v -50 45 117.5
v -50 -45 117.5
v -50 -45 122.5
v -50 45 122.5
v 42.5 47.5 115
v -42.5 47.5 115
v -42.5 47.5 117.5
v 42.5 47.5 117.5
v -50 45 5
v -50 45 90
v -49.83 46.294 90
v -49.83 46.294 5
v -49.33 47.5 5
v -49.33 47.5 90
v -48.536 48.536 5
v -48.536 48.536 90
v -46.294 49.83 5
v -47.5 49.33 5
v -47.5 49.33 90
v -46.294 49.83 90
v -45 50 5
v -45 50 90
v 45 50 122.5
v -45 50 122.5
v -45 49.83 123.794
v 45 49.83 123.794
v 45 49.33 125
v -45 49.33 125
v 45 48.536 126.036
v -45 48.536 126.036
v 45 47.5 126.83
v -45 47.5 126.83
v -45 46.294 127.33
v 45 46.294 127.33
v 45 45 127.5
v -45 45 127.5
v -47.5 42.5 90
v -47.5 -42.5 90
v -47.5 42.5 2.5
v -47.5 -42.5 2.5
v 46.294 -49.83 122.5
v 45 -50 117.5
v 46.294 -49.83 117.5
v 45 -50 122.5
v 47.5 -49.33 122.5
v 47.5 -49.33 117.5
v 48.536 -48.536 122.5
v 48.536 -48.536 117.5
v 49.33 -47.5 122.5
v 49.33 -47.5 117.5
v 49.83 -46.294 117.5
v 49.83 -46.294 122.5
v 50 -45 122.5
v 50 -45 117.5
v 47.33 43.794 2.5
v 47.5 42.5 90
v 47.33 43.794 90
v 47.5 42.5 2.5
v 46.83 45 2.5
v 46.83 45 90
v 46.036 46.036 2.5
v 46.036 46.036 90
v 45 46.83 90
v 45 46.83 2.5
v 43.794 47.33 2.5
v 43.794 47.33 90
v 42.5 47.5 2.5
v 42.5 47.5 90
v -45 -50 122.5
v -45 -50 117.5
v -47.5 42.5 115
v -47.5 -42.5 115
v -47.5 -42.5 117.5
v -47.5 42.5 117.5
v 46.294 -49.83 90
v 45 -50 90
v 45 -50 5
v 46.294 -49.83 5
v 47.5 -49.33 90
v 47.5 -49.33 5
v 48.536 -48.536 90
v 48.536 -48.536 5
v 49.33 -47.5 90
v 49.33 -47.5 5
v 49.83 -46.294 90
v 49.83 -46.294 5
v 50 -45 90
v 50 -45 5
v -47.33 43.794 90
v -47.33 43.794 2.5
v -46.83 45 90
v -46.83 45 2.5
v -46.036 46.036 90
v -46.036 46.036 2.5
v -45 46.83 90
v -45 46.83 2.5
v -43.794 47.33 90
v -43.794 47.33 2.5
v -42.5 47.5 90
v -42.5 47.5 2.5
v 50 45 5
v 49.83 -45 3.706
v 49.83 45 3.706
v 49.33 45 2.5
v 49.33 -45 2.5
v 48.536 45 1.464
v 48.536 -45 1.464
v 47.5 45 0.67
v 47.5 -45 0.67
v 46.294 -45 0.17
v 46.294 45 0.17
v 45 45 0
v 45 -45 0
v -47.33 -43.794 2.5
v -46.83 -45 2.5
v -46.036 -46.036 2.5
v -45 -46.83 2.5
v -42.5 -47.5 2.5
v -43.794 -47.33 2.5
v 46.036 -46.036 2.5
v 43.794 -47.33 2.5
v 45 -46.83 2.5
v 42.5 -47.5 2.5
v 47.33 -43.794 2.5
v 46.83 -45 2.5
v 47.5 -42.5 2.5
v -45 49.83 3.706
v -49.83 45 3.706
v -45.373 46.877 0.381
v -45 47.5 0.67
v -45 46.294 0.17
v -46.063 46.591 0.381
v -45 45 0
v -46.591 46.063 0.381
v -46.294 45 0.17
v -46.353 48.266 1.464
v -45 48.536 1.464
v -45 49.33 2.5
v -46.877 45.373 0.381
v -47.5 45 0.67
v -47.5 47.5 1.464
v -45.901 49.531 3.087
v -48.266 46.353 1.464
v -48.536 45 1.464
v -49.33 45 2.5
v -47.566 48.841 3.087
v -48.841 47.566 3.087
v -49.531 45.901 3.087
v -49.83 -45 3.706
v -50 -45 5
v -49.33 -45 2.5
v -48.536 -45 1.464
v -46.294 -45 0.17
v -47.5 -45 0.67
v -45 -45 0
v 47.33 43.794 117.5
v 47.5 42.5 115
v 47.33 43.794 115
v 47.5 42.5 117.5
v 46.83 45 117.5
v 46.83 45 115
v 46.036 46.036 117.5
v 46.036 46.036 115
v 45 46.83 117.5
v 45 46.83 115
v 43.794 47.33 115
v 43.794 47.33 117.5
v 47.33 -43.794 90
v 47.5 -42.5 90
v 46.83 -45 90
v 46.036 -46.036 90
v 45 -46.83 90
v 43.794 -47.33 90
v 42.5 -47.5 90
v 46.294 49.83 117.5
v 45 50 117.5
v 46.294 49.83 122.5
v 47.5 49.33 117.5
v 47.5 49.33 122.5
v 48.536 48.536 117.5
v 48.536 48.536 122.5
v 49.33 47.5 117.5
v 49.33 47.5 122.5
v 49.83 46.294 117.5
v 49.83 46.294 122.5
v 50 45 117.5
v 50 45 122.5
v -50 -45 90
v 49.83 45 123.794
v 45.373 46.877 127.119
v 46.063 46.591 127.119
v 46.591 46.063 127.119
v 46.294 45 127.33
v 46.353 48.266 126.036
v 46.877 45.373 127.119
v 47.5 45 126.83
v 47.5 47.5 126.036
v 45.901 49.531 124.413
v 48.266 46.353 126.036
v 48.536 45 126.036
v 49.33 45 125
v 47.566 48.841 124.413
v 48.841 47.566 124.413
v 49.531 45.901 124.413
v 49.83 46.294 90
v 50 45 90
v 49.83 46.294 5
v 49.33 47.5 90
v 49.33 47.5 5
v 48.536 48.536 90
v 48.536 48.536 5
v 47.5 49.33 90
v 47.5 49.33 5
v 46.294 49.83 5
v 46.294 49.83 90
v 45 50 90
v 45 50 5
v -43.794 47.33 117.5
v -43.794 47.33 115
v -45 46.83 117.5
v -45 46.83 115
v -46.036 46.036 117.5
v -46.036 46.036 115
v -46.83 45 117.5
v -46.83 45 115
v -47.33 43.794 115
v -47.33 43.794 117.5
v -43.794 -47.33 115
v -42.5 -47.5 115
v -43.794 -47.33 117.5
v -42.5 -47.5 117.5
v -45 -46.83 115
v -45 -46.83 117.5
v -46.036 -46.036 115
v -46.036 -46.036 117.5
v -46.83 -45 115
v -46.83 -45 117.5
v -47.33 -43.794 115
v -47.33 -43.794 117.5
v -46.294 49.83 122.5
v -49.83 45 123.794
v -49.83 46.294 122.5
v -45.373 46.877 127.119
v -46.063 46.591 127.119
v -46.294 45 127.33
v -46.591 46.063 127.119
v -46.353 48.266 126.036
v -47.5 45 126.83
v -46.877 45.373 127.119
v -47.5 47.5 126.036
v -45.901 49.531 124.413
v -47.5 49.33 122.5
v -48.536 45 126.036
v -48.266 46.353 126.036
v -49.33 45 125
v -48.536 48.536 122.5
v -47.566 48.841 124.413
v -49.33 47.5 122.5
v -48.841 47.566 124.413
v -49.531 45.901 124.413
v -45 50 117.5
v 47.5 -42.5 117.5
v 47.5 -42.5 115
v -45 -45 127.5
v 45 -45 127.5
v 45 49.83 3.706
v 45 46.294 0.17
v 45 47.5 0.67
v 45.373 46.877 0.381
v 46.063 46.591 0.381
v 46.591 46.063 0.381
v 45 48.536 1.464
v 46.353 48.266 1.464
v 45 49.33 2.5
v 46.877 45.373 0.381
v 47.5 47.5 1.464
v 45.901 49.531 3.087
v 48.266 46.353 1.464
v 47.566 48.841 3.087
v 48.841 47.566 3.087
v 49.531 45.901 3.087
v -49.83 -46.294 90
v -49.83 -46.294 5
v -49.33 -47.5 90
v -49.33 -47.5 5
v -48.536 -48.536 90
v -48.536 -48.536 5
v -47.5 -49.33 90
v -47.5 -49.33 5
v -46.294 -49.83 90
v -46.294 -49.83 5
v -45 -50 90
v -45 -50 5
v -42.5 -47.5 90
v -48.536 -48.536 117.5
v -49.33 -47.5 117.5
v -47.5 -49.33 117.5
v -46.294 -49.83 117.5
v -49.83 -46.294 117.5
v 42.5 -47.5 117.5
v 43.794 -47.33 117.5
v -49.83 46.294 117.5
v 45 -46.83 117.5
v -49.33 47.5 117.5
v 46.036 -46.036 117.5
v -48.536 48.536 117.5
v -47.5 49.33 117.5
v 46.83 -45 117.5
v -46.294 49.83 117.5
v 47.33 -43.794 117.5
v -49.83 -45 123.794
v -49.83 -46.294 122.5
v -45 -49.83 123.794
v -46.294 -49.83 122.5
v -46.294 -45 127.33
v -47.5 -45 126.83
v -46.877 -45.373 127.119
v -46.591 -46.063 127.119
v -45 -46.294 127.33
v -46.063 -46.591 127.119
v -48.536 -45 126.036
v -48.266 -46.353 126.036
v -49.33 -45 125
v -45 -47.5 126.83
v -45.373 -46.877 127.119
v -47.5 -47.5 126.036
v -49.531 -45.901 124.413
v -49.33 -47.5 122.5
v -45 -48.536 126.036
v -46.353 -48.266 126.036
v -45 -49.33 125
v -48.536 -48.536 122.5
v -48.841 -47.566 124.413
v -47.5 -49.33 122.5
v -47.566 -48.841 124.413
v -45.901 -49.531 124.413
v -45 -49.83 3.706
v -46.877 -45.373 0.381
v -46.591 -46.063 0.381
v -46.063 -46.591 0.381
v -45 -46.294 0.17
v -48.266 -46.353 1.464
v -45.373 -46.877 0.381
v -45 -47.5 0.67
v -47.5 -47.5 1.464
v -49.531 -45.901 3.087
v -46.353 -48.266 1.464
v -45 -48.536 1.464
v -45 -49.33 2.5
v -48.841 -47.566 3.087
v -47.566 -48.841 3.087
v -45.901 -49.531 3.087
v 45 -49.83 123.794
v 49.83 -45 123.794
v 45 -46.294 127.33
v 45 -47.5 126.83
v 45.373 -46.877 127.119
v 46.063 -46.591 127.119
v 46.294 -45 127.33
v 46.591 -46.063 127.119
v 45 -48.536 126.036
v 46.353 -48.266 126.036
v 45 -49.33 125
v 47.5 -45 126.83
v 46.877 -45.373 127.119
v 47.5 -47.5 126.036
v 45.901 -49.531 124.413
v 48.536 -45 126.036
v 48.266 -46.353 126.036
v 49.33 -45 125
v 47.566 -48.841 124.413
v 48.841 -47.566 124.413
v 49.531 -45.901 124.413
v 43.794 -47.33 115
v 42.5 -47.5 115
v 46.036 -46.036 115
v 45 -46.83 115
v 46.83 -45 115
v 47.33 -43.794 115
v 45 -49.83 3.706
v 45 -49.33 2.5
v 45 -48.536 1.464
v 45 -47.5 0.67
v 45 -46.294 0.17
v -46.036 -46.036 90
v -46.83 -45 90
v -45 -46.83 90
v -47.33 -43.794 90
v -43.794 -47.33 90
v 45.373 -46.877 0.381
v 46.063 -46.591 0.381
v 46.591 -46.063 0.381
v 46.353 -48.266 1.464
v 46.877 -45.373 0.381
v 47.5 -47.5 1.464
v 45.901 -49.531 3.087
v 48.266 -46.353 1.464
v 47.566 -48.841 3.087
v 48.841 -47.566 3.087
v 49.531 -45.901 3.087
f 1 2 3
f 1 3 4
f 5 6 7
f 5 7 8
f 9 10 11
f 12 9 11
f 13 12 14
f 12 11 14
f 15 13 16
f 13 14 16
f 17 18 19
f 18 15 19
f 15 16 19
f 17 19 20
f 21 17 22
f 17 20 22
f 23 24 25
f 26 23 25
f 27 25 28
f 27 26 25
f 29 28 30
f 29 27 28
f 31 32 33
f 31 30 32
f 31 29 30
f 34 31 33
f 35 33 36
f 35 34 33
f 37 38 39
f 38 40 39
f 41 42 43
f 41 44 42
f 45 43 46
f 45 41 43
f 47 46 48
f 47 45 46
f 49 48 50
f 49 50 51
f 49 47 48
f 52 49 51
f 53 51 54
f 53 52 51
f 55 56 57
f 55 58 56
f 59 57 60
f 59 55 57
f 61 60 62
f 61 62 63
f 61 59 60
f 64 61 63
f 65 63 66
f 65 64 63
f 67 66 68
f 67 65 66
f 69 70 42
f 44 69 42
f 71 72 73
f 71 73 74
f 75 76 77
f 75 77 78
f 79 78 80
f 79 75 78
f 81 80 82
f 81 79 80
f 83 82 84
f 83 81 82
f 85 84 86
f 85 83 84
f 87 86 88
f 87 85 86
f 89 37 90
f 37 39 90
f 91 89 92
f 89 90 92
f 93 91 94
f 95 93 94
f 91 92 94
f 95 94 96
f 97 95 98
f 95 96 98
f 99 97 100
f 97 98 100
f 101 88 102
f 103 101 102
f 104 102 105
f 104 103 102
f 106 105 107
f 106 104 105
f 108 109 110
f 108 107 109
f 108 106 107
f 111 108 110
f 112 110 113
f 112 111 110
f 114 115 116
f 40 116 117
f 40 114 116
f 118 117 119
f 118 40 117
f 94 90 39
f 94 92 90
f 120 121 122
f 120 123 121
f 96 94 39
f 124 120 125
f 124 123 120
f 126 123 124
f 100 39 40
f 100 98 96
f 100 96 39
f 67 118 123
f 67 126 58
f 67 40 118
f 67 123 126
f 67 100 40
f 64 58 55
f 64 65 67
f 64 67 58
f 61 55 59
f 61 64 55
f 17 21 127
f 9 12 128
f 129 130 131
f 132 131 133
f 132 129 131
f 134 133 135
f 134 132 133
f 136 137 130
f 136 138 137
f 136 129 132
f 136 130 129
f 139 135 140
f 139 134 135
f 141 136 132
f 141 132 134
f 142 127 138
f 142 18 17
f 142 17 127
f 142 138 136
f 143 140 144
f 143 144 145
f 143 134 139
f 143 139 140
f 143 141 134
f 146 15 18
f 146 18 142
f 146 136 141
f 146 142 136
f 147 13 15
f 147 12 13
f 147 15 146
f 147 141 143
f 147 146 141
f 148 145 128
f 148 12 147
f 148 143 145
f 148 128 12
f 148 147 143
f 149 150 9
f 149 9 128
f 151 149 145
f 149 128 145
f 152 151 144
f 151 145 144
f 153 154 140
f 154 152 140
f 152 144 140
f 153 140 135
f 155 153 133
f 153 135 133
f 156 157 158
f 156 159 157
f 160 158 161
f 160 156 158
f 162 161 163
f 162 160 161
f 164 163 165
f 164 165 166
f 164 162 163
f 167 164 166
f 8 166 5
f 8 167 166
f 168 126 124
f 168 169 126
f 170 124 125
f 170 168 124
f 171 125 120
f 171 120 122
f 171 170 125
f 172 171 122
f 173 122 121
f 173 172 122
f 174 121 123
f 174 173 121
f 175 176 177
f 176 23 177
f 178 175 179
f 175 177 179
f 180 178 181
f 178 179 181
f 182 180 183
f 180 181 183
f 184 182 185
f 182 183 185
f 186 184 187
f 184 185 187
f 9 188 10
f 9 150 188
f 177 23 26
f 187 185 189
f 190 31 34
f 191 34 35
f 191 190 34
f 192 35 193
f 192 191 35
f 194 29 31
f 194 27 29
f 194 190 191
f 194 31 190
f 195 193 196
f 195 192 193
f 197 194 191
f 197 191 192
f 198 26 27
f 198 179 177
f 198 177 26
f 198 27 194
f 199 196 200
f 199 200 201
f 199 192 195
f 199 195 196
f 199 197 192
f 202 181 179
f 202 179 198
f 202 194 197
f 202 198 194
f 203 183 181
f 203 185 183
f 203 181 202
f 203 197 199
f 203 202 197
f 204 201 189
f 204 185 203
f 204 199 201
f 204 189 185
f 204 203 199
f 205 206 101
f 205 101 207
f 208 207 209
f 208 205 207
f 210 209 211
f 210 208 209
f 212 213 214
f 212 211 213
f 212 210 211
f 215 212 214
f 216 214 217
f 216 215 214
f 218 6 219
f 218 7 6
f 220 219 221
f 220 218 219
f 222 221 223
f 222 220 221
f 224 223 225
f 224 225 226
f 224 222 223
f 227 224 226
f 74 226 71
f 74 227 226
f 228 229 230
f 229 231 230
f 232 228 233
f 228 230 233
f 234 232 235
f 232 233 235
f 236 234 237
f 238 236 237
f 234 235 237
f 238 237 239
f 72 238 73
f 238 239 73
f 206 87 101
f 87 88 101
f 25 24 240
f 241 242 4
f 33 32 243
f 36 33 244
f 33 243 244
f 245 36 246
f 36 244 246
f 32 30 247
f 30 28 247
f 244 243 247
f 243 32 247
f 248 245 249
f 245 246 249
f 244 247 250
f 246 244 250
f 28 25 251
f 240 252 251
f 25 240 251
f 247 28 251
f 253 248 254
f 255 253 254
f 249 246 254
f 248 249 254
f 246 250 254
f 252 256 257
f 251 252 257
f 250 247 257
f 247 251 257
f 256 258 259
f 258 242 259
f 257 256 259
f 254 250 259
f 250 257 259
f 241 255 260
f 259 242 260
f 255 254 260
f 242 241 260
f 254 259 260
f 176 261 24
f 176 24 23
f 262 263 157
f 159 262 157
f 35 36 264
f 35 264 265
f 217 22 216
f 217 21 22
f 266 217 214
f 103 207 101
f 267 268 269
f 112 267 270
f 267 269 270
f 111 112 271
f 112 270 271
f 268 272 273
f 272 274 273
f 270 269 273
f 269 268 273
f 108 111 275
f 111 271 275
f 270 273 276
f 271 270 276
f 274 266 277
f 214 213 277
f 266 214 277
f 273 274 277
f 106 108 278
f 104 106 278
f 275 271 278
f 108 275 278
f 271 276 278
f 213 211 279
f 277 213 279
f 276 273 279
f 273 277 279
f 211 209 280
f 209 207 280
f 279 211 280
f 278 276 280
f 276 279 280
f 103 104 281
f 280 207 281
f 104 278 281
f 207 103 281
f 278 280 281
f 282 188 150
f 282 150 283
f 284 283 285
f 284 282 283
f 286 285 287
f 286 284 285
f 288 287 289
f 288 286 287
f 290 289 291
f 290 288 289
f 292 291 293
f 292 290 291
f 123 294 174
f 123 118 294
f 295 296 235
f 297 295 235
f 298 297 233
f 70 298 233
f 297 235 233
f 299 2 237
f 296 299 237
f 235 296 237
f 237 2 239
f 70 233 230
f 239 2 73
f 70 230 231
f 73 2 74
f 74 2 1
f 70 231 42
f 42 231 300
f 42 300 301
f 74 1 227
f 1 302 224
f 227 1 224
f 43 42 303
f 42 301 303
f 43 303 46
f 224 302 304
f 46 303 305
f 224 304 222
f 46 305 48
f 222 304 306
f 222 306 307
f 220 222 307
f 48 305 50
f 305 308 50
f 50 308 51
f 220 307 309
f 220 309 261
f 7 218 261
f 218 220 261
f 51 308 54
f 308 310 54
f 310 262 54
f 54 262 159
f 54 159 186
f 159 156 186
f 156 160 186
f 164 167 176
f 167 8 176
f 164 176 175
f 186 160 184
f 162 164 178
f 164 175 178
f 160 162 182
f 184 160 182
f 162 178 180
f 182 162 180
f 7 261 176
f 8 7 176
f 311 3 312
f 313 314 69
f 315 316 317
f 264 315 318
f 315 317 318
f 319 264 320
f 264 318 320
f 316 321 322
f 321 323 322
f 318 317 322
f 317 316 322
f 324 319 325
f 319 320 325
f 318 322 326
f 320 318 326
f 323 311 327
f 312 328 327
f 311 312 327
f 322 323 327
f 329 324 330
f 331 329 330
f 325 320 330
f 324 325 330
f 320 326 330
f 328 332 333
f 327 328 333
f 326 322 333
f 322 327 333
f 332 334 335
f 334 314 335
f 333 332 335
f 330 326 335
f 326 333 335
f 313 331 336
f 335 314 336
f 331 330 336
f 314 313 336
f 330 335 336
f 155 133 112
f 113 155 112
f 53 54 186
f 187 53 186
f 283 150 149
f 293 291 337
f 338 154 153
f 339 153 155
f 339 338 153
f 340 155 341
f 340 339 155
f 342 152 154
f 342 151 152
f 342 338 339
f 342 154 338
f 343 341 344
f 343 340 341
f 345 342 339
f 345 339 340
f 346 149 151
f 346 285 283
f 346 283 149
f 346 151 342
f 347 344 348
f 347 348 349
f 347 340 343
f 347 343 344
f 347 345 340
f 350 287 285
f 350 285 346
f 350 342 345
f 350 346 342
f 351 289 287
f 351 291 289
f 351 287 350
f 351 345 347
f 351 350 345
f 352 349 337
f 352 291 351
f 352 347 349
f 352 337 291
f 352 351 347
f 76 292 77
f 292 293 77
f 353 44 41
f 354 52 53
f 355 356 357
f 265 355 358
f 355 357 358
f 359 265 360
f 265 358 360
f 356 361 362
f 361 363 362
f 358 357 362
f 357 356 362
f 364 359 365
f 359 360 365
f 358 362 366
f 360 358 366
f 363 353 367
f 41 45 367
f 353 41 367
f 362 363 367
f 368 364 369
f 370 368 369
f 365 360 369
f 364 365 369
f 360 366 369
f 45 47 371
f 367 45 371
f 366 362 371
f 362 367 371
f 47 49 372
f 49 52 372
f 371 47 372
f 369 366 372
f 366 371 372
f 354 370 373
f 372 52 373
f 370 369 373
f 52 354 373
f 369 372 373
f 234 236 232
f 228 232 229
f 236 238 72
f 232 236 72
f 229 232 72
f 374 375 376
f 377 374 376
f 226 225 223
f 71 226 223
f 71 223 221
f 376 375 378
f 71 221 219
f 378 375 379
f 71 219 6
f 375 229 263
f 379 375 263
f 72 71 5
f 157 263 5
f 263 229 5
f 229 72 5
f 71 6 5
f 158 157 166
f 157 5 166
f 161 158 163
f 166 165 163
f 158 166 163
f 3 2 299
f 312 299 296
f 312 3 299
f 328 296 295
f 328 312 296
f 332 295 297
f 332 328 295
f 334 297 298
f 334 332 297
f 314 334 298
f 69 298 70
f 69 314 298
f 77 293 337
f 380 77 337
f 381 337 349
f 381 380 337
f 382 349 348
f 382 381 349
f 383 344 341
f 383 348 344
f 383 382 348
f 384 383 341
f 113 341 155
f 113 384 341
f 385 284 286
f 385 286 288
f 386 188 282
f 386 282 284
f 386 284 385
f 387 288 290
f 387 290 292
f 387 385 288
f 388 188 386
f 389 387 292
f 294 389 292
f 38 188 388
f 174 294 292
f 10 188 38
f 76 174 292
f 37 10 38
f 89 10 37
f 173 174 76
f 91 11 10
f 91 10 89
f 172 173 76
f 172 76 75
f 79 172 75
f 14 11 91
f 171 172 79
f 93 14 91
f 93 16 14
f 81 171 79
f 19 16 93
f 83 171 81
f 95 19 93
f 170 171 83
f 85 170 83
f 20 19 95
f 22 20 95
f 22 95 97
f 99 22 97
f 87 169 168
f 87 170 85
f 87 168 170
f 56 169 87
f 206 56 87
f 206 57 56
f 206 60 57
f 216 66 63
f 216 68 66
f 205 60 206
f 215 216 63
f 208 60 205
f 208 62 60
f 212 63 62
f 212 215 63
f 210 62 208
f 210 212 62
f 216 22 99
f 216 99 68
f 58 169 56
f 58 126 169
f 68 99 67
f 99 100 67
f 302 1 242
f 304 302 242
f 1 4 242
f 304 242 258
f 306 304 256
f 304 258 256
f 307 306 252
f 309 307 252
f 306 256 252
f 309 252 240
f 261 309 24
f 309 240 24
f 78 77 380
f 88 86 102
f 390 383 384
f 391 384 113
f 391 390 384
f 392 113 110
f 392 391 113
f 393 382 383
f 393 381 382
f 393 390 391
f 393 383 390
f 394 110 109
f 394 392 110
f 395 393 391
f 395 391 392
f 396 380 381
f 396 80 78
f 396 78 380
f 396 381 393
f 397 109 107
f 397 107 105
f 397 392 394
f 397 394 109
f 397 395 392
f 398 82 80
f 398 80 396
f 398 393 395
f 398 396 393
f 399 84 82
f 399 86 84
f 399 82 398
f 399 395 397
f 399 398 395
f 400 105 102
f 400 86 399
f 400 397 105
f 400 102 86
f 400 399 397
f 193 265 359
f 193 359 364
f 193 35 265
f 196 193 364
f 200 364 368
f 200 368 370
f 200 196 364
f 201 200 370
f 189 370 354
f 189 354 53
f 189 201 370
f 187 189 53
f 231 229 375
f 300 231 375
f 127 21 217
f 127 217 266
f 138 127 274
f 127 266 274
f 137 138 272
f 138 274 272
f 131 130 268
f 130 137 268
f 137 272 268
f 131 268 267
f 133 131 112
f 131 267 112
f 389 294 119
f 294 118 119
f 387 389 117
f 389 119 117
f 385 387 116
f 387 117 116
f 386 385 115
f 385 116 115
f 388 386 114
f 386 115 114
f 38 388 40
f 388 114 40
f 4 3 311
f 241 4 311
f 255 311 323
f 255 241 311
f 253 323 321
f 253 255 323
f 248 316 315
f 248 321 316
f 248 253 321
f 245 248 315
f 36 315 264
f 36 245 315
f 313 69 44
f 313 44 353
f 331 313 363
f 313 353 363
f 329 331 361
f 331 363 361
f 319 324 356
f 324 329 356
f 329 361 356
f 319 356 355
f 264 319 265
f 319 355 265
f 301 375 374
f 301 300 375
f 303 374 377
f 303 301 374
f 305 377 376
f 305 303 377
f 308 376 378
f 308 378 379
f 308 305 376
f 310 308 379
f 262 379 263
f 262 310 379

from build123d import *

# Parameters (mm, degrees)
F0_W     = 100
F0_H     = 100
F1_DEPTH = 90
F2_T     = -2.5
F4_W     = 95
F4_H     = 95
F5_DEPTH = 2.5
F6_W     = 100
F6_H     = 100
F7_DEPTH = 10
F8_R     = 5
F8_2_R   = 5
F9_R     = 5
F9_2_R   = 5


with BuildPart() as f1:
    # F0 (on Top) → F1 (new body)
    with BuildSketch(Plane.XY):
        Rectangle(F0_W, F0_H)
    extrude(amount=F1_DEPTH)

    # F2
    f2_openings = [f1.faces().sort_by_distance(p)[0] for p in [
        (0, 0, 90),
    ]]
    offset(amount=F2_T, openings=f2_openings)

    # F8
    f8_edges = [f1.edges().sort_by_distance(p)[0] for p in [
        (50, 50, 45),
        (-50, 50, 45),
        (-50, -50, 45),
        (50, -50, 45),
        (0, 50, 0),
        (-50, 0, 0),
        (0, -50, 0),
        (50, 0, 0),
    ]]
    fillet(f8_edges, radius=F8_R)

    # F9
    f9_edges = [f1.edges().sort_by_distance(p)[0] for p in [
        (-47.5, 47.5, 46.25),
        (47.5, 47.5, 46.25),
        (47.5, -47.5, 46.25),
        (-47.5, -47.5, 46.25),
    ]]
    fillet(f9_edges, radius=F9_R)


with BuildPart() as f5:
    # F4 (on offset) → F5 (new body)
    with BuildSketch(Plane.XY.offset(115)):
        Rectangle(F4_W, F4_H)
    extrude(amount=F5_DEPTH)

    # F6 (on face) → F7 (join)
    with BuildSketch(Plane.XY.offset(117.5)):
        Rectangle(F6_W, F6_H)
    extrude(amount=F7_DEPTH)

    # F8#2
    f8_2_edges = [f5.edges().sort_by_distance(p)[0] for p in [
        (50, 50, 122.5),
        (-50, 50, 122.5),
        (-50, -50, 122.5),
        (50, -50, 122.5),
        (0, 50, 127.5),
        (-50, 0, 127.5),
        (0, -50, 127.5),
        (50, 0, 127.5),
    ]]
    fillet(f8_2_edges, radius=F8_2_R)

    # F9#2
    f9_2_edges = [f5.edges().sort_by_distance(p)[0] for p in [
        (47.5, 47.5, 116.25),
        (47.5, -47.5, 116.25),
        (-47.5, -47.5, 116.25),
        (-47.5, 47.5, 116.25),
    ]]
    fillet(f9_2_edges, radius=F9_2_R)


solid = Compound([f1.part, f5.part])
